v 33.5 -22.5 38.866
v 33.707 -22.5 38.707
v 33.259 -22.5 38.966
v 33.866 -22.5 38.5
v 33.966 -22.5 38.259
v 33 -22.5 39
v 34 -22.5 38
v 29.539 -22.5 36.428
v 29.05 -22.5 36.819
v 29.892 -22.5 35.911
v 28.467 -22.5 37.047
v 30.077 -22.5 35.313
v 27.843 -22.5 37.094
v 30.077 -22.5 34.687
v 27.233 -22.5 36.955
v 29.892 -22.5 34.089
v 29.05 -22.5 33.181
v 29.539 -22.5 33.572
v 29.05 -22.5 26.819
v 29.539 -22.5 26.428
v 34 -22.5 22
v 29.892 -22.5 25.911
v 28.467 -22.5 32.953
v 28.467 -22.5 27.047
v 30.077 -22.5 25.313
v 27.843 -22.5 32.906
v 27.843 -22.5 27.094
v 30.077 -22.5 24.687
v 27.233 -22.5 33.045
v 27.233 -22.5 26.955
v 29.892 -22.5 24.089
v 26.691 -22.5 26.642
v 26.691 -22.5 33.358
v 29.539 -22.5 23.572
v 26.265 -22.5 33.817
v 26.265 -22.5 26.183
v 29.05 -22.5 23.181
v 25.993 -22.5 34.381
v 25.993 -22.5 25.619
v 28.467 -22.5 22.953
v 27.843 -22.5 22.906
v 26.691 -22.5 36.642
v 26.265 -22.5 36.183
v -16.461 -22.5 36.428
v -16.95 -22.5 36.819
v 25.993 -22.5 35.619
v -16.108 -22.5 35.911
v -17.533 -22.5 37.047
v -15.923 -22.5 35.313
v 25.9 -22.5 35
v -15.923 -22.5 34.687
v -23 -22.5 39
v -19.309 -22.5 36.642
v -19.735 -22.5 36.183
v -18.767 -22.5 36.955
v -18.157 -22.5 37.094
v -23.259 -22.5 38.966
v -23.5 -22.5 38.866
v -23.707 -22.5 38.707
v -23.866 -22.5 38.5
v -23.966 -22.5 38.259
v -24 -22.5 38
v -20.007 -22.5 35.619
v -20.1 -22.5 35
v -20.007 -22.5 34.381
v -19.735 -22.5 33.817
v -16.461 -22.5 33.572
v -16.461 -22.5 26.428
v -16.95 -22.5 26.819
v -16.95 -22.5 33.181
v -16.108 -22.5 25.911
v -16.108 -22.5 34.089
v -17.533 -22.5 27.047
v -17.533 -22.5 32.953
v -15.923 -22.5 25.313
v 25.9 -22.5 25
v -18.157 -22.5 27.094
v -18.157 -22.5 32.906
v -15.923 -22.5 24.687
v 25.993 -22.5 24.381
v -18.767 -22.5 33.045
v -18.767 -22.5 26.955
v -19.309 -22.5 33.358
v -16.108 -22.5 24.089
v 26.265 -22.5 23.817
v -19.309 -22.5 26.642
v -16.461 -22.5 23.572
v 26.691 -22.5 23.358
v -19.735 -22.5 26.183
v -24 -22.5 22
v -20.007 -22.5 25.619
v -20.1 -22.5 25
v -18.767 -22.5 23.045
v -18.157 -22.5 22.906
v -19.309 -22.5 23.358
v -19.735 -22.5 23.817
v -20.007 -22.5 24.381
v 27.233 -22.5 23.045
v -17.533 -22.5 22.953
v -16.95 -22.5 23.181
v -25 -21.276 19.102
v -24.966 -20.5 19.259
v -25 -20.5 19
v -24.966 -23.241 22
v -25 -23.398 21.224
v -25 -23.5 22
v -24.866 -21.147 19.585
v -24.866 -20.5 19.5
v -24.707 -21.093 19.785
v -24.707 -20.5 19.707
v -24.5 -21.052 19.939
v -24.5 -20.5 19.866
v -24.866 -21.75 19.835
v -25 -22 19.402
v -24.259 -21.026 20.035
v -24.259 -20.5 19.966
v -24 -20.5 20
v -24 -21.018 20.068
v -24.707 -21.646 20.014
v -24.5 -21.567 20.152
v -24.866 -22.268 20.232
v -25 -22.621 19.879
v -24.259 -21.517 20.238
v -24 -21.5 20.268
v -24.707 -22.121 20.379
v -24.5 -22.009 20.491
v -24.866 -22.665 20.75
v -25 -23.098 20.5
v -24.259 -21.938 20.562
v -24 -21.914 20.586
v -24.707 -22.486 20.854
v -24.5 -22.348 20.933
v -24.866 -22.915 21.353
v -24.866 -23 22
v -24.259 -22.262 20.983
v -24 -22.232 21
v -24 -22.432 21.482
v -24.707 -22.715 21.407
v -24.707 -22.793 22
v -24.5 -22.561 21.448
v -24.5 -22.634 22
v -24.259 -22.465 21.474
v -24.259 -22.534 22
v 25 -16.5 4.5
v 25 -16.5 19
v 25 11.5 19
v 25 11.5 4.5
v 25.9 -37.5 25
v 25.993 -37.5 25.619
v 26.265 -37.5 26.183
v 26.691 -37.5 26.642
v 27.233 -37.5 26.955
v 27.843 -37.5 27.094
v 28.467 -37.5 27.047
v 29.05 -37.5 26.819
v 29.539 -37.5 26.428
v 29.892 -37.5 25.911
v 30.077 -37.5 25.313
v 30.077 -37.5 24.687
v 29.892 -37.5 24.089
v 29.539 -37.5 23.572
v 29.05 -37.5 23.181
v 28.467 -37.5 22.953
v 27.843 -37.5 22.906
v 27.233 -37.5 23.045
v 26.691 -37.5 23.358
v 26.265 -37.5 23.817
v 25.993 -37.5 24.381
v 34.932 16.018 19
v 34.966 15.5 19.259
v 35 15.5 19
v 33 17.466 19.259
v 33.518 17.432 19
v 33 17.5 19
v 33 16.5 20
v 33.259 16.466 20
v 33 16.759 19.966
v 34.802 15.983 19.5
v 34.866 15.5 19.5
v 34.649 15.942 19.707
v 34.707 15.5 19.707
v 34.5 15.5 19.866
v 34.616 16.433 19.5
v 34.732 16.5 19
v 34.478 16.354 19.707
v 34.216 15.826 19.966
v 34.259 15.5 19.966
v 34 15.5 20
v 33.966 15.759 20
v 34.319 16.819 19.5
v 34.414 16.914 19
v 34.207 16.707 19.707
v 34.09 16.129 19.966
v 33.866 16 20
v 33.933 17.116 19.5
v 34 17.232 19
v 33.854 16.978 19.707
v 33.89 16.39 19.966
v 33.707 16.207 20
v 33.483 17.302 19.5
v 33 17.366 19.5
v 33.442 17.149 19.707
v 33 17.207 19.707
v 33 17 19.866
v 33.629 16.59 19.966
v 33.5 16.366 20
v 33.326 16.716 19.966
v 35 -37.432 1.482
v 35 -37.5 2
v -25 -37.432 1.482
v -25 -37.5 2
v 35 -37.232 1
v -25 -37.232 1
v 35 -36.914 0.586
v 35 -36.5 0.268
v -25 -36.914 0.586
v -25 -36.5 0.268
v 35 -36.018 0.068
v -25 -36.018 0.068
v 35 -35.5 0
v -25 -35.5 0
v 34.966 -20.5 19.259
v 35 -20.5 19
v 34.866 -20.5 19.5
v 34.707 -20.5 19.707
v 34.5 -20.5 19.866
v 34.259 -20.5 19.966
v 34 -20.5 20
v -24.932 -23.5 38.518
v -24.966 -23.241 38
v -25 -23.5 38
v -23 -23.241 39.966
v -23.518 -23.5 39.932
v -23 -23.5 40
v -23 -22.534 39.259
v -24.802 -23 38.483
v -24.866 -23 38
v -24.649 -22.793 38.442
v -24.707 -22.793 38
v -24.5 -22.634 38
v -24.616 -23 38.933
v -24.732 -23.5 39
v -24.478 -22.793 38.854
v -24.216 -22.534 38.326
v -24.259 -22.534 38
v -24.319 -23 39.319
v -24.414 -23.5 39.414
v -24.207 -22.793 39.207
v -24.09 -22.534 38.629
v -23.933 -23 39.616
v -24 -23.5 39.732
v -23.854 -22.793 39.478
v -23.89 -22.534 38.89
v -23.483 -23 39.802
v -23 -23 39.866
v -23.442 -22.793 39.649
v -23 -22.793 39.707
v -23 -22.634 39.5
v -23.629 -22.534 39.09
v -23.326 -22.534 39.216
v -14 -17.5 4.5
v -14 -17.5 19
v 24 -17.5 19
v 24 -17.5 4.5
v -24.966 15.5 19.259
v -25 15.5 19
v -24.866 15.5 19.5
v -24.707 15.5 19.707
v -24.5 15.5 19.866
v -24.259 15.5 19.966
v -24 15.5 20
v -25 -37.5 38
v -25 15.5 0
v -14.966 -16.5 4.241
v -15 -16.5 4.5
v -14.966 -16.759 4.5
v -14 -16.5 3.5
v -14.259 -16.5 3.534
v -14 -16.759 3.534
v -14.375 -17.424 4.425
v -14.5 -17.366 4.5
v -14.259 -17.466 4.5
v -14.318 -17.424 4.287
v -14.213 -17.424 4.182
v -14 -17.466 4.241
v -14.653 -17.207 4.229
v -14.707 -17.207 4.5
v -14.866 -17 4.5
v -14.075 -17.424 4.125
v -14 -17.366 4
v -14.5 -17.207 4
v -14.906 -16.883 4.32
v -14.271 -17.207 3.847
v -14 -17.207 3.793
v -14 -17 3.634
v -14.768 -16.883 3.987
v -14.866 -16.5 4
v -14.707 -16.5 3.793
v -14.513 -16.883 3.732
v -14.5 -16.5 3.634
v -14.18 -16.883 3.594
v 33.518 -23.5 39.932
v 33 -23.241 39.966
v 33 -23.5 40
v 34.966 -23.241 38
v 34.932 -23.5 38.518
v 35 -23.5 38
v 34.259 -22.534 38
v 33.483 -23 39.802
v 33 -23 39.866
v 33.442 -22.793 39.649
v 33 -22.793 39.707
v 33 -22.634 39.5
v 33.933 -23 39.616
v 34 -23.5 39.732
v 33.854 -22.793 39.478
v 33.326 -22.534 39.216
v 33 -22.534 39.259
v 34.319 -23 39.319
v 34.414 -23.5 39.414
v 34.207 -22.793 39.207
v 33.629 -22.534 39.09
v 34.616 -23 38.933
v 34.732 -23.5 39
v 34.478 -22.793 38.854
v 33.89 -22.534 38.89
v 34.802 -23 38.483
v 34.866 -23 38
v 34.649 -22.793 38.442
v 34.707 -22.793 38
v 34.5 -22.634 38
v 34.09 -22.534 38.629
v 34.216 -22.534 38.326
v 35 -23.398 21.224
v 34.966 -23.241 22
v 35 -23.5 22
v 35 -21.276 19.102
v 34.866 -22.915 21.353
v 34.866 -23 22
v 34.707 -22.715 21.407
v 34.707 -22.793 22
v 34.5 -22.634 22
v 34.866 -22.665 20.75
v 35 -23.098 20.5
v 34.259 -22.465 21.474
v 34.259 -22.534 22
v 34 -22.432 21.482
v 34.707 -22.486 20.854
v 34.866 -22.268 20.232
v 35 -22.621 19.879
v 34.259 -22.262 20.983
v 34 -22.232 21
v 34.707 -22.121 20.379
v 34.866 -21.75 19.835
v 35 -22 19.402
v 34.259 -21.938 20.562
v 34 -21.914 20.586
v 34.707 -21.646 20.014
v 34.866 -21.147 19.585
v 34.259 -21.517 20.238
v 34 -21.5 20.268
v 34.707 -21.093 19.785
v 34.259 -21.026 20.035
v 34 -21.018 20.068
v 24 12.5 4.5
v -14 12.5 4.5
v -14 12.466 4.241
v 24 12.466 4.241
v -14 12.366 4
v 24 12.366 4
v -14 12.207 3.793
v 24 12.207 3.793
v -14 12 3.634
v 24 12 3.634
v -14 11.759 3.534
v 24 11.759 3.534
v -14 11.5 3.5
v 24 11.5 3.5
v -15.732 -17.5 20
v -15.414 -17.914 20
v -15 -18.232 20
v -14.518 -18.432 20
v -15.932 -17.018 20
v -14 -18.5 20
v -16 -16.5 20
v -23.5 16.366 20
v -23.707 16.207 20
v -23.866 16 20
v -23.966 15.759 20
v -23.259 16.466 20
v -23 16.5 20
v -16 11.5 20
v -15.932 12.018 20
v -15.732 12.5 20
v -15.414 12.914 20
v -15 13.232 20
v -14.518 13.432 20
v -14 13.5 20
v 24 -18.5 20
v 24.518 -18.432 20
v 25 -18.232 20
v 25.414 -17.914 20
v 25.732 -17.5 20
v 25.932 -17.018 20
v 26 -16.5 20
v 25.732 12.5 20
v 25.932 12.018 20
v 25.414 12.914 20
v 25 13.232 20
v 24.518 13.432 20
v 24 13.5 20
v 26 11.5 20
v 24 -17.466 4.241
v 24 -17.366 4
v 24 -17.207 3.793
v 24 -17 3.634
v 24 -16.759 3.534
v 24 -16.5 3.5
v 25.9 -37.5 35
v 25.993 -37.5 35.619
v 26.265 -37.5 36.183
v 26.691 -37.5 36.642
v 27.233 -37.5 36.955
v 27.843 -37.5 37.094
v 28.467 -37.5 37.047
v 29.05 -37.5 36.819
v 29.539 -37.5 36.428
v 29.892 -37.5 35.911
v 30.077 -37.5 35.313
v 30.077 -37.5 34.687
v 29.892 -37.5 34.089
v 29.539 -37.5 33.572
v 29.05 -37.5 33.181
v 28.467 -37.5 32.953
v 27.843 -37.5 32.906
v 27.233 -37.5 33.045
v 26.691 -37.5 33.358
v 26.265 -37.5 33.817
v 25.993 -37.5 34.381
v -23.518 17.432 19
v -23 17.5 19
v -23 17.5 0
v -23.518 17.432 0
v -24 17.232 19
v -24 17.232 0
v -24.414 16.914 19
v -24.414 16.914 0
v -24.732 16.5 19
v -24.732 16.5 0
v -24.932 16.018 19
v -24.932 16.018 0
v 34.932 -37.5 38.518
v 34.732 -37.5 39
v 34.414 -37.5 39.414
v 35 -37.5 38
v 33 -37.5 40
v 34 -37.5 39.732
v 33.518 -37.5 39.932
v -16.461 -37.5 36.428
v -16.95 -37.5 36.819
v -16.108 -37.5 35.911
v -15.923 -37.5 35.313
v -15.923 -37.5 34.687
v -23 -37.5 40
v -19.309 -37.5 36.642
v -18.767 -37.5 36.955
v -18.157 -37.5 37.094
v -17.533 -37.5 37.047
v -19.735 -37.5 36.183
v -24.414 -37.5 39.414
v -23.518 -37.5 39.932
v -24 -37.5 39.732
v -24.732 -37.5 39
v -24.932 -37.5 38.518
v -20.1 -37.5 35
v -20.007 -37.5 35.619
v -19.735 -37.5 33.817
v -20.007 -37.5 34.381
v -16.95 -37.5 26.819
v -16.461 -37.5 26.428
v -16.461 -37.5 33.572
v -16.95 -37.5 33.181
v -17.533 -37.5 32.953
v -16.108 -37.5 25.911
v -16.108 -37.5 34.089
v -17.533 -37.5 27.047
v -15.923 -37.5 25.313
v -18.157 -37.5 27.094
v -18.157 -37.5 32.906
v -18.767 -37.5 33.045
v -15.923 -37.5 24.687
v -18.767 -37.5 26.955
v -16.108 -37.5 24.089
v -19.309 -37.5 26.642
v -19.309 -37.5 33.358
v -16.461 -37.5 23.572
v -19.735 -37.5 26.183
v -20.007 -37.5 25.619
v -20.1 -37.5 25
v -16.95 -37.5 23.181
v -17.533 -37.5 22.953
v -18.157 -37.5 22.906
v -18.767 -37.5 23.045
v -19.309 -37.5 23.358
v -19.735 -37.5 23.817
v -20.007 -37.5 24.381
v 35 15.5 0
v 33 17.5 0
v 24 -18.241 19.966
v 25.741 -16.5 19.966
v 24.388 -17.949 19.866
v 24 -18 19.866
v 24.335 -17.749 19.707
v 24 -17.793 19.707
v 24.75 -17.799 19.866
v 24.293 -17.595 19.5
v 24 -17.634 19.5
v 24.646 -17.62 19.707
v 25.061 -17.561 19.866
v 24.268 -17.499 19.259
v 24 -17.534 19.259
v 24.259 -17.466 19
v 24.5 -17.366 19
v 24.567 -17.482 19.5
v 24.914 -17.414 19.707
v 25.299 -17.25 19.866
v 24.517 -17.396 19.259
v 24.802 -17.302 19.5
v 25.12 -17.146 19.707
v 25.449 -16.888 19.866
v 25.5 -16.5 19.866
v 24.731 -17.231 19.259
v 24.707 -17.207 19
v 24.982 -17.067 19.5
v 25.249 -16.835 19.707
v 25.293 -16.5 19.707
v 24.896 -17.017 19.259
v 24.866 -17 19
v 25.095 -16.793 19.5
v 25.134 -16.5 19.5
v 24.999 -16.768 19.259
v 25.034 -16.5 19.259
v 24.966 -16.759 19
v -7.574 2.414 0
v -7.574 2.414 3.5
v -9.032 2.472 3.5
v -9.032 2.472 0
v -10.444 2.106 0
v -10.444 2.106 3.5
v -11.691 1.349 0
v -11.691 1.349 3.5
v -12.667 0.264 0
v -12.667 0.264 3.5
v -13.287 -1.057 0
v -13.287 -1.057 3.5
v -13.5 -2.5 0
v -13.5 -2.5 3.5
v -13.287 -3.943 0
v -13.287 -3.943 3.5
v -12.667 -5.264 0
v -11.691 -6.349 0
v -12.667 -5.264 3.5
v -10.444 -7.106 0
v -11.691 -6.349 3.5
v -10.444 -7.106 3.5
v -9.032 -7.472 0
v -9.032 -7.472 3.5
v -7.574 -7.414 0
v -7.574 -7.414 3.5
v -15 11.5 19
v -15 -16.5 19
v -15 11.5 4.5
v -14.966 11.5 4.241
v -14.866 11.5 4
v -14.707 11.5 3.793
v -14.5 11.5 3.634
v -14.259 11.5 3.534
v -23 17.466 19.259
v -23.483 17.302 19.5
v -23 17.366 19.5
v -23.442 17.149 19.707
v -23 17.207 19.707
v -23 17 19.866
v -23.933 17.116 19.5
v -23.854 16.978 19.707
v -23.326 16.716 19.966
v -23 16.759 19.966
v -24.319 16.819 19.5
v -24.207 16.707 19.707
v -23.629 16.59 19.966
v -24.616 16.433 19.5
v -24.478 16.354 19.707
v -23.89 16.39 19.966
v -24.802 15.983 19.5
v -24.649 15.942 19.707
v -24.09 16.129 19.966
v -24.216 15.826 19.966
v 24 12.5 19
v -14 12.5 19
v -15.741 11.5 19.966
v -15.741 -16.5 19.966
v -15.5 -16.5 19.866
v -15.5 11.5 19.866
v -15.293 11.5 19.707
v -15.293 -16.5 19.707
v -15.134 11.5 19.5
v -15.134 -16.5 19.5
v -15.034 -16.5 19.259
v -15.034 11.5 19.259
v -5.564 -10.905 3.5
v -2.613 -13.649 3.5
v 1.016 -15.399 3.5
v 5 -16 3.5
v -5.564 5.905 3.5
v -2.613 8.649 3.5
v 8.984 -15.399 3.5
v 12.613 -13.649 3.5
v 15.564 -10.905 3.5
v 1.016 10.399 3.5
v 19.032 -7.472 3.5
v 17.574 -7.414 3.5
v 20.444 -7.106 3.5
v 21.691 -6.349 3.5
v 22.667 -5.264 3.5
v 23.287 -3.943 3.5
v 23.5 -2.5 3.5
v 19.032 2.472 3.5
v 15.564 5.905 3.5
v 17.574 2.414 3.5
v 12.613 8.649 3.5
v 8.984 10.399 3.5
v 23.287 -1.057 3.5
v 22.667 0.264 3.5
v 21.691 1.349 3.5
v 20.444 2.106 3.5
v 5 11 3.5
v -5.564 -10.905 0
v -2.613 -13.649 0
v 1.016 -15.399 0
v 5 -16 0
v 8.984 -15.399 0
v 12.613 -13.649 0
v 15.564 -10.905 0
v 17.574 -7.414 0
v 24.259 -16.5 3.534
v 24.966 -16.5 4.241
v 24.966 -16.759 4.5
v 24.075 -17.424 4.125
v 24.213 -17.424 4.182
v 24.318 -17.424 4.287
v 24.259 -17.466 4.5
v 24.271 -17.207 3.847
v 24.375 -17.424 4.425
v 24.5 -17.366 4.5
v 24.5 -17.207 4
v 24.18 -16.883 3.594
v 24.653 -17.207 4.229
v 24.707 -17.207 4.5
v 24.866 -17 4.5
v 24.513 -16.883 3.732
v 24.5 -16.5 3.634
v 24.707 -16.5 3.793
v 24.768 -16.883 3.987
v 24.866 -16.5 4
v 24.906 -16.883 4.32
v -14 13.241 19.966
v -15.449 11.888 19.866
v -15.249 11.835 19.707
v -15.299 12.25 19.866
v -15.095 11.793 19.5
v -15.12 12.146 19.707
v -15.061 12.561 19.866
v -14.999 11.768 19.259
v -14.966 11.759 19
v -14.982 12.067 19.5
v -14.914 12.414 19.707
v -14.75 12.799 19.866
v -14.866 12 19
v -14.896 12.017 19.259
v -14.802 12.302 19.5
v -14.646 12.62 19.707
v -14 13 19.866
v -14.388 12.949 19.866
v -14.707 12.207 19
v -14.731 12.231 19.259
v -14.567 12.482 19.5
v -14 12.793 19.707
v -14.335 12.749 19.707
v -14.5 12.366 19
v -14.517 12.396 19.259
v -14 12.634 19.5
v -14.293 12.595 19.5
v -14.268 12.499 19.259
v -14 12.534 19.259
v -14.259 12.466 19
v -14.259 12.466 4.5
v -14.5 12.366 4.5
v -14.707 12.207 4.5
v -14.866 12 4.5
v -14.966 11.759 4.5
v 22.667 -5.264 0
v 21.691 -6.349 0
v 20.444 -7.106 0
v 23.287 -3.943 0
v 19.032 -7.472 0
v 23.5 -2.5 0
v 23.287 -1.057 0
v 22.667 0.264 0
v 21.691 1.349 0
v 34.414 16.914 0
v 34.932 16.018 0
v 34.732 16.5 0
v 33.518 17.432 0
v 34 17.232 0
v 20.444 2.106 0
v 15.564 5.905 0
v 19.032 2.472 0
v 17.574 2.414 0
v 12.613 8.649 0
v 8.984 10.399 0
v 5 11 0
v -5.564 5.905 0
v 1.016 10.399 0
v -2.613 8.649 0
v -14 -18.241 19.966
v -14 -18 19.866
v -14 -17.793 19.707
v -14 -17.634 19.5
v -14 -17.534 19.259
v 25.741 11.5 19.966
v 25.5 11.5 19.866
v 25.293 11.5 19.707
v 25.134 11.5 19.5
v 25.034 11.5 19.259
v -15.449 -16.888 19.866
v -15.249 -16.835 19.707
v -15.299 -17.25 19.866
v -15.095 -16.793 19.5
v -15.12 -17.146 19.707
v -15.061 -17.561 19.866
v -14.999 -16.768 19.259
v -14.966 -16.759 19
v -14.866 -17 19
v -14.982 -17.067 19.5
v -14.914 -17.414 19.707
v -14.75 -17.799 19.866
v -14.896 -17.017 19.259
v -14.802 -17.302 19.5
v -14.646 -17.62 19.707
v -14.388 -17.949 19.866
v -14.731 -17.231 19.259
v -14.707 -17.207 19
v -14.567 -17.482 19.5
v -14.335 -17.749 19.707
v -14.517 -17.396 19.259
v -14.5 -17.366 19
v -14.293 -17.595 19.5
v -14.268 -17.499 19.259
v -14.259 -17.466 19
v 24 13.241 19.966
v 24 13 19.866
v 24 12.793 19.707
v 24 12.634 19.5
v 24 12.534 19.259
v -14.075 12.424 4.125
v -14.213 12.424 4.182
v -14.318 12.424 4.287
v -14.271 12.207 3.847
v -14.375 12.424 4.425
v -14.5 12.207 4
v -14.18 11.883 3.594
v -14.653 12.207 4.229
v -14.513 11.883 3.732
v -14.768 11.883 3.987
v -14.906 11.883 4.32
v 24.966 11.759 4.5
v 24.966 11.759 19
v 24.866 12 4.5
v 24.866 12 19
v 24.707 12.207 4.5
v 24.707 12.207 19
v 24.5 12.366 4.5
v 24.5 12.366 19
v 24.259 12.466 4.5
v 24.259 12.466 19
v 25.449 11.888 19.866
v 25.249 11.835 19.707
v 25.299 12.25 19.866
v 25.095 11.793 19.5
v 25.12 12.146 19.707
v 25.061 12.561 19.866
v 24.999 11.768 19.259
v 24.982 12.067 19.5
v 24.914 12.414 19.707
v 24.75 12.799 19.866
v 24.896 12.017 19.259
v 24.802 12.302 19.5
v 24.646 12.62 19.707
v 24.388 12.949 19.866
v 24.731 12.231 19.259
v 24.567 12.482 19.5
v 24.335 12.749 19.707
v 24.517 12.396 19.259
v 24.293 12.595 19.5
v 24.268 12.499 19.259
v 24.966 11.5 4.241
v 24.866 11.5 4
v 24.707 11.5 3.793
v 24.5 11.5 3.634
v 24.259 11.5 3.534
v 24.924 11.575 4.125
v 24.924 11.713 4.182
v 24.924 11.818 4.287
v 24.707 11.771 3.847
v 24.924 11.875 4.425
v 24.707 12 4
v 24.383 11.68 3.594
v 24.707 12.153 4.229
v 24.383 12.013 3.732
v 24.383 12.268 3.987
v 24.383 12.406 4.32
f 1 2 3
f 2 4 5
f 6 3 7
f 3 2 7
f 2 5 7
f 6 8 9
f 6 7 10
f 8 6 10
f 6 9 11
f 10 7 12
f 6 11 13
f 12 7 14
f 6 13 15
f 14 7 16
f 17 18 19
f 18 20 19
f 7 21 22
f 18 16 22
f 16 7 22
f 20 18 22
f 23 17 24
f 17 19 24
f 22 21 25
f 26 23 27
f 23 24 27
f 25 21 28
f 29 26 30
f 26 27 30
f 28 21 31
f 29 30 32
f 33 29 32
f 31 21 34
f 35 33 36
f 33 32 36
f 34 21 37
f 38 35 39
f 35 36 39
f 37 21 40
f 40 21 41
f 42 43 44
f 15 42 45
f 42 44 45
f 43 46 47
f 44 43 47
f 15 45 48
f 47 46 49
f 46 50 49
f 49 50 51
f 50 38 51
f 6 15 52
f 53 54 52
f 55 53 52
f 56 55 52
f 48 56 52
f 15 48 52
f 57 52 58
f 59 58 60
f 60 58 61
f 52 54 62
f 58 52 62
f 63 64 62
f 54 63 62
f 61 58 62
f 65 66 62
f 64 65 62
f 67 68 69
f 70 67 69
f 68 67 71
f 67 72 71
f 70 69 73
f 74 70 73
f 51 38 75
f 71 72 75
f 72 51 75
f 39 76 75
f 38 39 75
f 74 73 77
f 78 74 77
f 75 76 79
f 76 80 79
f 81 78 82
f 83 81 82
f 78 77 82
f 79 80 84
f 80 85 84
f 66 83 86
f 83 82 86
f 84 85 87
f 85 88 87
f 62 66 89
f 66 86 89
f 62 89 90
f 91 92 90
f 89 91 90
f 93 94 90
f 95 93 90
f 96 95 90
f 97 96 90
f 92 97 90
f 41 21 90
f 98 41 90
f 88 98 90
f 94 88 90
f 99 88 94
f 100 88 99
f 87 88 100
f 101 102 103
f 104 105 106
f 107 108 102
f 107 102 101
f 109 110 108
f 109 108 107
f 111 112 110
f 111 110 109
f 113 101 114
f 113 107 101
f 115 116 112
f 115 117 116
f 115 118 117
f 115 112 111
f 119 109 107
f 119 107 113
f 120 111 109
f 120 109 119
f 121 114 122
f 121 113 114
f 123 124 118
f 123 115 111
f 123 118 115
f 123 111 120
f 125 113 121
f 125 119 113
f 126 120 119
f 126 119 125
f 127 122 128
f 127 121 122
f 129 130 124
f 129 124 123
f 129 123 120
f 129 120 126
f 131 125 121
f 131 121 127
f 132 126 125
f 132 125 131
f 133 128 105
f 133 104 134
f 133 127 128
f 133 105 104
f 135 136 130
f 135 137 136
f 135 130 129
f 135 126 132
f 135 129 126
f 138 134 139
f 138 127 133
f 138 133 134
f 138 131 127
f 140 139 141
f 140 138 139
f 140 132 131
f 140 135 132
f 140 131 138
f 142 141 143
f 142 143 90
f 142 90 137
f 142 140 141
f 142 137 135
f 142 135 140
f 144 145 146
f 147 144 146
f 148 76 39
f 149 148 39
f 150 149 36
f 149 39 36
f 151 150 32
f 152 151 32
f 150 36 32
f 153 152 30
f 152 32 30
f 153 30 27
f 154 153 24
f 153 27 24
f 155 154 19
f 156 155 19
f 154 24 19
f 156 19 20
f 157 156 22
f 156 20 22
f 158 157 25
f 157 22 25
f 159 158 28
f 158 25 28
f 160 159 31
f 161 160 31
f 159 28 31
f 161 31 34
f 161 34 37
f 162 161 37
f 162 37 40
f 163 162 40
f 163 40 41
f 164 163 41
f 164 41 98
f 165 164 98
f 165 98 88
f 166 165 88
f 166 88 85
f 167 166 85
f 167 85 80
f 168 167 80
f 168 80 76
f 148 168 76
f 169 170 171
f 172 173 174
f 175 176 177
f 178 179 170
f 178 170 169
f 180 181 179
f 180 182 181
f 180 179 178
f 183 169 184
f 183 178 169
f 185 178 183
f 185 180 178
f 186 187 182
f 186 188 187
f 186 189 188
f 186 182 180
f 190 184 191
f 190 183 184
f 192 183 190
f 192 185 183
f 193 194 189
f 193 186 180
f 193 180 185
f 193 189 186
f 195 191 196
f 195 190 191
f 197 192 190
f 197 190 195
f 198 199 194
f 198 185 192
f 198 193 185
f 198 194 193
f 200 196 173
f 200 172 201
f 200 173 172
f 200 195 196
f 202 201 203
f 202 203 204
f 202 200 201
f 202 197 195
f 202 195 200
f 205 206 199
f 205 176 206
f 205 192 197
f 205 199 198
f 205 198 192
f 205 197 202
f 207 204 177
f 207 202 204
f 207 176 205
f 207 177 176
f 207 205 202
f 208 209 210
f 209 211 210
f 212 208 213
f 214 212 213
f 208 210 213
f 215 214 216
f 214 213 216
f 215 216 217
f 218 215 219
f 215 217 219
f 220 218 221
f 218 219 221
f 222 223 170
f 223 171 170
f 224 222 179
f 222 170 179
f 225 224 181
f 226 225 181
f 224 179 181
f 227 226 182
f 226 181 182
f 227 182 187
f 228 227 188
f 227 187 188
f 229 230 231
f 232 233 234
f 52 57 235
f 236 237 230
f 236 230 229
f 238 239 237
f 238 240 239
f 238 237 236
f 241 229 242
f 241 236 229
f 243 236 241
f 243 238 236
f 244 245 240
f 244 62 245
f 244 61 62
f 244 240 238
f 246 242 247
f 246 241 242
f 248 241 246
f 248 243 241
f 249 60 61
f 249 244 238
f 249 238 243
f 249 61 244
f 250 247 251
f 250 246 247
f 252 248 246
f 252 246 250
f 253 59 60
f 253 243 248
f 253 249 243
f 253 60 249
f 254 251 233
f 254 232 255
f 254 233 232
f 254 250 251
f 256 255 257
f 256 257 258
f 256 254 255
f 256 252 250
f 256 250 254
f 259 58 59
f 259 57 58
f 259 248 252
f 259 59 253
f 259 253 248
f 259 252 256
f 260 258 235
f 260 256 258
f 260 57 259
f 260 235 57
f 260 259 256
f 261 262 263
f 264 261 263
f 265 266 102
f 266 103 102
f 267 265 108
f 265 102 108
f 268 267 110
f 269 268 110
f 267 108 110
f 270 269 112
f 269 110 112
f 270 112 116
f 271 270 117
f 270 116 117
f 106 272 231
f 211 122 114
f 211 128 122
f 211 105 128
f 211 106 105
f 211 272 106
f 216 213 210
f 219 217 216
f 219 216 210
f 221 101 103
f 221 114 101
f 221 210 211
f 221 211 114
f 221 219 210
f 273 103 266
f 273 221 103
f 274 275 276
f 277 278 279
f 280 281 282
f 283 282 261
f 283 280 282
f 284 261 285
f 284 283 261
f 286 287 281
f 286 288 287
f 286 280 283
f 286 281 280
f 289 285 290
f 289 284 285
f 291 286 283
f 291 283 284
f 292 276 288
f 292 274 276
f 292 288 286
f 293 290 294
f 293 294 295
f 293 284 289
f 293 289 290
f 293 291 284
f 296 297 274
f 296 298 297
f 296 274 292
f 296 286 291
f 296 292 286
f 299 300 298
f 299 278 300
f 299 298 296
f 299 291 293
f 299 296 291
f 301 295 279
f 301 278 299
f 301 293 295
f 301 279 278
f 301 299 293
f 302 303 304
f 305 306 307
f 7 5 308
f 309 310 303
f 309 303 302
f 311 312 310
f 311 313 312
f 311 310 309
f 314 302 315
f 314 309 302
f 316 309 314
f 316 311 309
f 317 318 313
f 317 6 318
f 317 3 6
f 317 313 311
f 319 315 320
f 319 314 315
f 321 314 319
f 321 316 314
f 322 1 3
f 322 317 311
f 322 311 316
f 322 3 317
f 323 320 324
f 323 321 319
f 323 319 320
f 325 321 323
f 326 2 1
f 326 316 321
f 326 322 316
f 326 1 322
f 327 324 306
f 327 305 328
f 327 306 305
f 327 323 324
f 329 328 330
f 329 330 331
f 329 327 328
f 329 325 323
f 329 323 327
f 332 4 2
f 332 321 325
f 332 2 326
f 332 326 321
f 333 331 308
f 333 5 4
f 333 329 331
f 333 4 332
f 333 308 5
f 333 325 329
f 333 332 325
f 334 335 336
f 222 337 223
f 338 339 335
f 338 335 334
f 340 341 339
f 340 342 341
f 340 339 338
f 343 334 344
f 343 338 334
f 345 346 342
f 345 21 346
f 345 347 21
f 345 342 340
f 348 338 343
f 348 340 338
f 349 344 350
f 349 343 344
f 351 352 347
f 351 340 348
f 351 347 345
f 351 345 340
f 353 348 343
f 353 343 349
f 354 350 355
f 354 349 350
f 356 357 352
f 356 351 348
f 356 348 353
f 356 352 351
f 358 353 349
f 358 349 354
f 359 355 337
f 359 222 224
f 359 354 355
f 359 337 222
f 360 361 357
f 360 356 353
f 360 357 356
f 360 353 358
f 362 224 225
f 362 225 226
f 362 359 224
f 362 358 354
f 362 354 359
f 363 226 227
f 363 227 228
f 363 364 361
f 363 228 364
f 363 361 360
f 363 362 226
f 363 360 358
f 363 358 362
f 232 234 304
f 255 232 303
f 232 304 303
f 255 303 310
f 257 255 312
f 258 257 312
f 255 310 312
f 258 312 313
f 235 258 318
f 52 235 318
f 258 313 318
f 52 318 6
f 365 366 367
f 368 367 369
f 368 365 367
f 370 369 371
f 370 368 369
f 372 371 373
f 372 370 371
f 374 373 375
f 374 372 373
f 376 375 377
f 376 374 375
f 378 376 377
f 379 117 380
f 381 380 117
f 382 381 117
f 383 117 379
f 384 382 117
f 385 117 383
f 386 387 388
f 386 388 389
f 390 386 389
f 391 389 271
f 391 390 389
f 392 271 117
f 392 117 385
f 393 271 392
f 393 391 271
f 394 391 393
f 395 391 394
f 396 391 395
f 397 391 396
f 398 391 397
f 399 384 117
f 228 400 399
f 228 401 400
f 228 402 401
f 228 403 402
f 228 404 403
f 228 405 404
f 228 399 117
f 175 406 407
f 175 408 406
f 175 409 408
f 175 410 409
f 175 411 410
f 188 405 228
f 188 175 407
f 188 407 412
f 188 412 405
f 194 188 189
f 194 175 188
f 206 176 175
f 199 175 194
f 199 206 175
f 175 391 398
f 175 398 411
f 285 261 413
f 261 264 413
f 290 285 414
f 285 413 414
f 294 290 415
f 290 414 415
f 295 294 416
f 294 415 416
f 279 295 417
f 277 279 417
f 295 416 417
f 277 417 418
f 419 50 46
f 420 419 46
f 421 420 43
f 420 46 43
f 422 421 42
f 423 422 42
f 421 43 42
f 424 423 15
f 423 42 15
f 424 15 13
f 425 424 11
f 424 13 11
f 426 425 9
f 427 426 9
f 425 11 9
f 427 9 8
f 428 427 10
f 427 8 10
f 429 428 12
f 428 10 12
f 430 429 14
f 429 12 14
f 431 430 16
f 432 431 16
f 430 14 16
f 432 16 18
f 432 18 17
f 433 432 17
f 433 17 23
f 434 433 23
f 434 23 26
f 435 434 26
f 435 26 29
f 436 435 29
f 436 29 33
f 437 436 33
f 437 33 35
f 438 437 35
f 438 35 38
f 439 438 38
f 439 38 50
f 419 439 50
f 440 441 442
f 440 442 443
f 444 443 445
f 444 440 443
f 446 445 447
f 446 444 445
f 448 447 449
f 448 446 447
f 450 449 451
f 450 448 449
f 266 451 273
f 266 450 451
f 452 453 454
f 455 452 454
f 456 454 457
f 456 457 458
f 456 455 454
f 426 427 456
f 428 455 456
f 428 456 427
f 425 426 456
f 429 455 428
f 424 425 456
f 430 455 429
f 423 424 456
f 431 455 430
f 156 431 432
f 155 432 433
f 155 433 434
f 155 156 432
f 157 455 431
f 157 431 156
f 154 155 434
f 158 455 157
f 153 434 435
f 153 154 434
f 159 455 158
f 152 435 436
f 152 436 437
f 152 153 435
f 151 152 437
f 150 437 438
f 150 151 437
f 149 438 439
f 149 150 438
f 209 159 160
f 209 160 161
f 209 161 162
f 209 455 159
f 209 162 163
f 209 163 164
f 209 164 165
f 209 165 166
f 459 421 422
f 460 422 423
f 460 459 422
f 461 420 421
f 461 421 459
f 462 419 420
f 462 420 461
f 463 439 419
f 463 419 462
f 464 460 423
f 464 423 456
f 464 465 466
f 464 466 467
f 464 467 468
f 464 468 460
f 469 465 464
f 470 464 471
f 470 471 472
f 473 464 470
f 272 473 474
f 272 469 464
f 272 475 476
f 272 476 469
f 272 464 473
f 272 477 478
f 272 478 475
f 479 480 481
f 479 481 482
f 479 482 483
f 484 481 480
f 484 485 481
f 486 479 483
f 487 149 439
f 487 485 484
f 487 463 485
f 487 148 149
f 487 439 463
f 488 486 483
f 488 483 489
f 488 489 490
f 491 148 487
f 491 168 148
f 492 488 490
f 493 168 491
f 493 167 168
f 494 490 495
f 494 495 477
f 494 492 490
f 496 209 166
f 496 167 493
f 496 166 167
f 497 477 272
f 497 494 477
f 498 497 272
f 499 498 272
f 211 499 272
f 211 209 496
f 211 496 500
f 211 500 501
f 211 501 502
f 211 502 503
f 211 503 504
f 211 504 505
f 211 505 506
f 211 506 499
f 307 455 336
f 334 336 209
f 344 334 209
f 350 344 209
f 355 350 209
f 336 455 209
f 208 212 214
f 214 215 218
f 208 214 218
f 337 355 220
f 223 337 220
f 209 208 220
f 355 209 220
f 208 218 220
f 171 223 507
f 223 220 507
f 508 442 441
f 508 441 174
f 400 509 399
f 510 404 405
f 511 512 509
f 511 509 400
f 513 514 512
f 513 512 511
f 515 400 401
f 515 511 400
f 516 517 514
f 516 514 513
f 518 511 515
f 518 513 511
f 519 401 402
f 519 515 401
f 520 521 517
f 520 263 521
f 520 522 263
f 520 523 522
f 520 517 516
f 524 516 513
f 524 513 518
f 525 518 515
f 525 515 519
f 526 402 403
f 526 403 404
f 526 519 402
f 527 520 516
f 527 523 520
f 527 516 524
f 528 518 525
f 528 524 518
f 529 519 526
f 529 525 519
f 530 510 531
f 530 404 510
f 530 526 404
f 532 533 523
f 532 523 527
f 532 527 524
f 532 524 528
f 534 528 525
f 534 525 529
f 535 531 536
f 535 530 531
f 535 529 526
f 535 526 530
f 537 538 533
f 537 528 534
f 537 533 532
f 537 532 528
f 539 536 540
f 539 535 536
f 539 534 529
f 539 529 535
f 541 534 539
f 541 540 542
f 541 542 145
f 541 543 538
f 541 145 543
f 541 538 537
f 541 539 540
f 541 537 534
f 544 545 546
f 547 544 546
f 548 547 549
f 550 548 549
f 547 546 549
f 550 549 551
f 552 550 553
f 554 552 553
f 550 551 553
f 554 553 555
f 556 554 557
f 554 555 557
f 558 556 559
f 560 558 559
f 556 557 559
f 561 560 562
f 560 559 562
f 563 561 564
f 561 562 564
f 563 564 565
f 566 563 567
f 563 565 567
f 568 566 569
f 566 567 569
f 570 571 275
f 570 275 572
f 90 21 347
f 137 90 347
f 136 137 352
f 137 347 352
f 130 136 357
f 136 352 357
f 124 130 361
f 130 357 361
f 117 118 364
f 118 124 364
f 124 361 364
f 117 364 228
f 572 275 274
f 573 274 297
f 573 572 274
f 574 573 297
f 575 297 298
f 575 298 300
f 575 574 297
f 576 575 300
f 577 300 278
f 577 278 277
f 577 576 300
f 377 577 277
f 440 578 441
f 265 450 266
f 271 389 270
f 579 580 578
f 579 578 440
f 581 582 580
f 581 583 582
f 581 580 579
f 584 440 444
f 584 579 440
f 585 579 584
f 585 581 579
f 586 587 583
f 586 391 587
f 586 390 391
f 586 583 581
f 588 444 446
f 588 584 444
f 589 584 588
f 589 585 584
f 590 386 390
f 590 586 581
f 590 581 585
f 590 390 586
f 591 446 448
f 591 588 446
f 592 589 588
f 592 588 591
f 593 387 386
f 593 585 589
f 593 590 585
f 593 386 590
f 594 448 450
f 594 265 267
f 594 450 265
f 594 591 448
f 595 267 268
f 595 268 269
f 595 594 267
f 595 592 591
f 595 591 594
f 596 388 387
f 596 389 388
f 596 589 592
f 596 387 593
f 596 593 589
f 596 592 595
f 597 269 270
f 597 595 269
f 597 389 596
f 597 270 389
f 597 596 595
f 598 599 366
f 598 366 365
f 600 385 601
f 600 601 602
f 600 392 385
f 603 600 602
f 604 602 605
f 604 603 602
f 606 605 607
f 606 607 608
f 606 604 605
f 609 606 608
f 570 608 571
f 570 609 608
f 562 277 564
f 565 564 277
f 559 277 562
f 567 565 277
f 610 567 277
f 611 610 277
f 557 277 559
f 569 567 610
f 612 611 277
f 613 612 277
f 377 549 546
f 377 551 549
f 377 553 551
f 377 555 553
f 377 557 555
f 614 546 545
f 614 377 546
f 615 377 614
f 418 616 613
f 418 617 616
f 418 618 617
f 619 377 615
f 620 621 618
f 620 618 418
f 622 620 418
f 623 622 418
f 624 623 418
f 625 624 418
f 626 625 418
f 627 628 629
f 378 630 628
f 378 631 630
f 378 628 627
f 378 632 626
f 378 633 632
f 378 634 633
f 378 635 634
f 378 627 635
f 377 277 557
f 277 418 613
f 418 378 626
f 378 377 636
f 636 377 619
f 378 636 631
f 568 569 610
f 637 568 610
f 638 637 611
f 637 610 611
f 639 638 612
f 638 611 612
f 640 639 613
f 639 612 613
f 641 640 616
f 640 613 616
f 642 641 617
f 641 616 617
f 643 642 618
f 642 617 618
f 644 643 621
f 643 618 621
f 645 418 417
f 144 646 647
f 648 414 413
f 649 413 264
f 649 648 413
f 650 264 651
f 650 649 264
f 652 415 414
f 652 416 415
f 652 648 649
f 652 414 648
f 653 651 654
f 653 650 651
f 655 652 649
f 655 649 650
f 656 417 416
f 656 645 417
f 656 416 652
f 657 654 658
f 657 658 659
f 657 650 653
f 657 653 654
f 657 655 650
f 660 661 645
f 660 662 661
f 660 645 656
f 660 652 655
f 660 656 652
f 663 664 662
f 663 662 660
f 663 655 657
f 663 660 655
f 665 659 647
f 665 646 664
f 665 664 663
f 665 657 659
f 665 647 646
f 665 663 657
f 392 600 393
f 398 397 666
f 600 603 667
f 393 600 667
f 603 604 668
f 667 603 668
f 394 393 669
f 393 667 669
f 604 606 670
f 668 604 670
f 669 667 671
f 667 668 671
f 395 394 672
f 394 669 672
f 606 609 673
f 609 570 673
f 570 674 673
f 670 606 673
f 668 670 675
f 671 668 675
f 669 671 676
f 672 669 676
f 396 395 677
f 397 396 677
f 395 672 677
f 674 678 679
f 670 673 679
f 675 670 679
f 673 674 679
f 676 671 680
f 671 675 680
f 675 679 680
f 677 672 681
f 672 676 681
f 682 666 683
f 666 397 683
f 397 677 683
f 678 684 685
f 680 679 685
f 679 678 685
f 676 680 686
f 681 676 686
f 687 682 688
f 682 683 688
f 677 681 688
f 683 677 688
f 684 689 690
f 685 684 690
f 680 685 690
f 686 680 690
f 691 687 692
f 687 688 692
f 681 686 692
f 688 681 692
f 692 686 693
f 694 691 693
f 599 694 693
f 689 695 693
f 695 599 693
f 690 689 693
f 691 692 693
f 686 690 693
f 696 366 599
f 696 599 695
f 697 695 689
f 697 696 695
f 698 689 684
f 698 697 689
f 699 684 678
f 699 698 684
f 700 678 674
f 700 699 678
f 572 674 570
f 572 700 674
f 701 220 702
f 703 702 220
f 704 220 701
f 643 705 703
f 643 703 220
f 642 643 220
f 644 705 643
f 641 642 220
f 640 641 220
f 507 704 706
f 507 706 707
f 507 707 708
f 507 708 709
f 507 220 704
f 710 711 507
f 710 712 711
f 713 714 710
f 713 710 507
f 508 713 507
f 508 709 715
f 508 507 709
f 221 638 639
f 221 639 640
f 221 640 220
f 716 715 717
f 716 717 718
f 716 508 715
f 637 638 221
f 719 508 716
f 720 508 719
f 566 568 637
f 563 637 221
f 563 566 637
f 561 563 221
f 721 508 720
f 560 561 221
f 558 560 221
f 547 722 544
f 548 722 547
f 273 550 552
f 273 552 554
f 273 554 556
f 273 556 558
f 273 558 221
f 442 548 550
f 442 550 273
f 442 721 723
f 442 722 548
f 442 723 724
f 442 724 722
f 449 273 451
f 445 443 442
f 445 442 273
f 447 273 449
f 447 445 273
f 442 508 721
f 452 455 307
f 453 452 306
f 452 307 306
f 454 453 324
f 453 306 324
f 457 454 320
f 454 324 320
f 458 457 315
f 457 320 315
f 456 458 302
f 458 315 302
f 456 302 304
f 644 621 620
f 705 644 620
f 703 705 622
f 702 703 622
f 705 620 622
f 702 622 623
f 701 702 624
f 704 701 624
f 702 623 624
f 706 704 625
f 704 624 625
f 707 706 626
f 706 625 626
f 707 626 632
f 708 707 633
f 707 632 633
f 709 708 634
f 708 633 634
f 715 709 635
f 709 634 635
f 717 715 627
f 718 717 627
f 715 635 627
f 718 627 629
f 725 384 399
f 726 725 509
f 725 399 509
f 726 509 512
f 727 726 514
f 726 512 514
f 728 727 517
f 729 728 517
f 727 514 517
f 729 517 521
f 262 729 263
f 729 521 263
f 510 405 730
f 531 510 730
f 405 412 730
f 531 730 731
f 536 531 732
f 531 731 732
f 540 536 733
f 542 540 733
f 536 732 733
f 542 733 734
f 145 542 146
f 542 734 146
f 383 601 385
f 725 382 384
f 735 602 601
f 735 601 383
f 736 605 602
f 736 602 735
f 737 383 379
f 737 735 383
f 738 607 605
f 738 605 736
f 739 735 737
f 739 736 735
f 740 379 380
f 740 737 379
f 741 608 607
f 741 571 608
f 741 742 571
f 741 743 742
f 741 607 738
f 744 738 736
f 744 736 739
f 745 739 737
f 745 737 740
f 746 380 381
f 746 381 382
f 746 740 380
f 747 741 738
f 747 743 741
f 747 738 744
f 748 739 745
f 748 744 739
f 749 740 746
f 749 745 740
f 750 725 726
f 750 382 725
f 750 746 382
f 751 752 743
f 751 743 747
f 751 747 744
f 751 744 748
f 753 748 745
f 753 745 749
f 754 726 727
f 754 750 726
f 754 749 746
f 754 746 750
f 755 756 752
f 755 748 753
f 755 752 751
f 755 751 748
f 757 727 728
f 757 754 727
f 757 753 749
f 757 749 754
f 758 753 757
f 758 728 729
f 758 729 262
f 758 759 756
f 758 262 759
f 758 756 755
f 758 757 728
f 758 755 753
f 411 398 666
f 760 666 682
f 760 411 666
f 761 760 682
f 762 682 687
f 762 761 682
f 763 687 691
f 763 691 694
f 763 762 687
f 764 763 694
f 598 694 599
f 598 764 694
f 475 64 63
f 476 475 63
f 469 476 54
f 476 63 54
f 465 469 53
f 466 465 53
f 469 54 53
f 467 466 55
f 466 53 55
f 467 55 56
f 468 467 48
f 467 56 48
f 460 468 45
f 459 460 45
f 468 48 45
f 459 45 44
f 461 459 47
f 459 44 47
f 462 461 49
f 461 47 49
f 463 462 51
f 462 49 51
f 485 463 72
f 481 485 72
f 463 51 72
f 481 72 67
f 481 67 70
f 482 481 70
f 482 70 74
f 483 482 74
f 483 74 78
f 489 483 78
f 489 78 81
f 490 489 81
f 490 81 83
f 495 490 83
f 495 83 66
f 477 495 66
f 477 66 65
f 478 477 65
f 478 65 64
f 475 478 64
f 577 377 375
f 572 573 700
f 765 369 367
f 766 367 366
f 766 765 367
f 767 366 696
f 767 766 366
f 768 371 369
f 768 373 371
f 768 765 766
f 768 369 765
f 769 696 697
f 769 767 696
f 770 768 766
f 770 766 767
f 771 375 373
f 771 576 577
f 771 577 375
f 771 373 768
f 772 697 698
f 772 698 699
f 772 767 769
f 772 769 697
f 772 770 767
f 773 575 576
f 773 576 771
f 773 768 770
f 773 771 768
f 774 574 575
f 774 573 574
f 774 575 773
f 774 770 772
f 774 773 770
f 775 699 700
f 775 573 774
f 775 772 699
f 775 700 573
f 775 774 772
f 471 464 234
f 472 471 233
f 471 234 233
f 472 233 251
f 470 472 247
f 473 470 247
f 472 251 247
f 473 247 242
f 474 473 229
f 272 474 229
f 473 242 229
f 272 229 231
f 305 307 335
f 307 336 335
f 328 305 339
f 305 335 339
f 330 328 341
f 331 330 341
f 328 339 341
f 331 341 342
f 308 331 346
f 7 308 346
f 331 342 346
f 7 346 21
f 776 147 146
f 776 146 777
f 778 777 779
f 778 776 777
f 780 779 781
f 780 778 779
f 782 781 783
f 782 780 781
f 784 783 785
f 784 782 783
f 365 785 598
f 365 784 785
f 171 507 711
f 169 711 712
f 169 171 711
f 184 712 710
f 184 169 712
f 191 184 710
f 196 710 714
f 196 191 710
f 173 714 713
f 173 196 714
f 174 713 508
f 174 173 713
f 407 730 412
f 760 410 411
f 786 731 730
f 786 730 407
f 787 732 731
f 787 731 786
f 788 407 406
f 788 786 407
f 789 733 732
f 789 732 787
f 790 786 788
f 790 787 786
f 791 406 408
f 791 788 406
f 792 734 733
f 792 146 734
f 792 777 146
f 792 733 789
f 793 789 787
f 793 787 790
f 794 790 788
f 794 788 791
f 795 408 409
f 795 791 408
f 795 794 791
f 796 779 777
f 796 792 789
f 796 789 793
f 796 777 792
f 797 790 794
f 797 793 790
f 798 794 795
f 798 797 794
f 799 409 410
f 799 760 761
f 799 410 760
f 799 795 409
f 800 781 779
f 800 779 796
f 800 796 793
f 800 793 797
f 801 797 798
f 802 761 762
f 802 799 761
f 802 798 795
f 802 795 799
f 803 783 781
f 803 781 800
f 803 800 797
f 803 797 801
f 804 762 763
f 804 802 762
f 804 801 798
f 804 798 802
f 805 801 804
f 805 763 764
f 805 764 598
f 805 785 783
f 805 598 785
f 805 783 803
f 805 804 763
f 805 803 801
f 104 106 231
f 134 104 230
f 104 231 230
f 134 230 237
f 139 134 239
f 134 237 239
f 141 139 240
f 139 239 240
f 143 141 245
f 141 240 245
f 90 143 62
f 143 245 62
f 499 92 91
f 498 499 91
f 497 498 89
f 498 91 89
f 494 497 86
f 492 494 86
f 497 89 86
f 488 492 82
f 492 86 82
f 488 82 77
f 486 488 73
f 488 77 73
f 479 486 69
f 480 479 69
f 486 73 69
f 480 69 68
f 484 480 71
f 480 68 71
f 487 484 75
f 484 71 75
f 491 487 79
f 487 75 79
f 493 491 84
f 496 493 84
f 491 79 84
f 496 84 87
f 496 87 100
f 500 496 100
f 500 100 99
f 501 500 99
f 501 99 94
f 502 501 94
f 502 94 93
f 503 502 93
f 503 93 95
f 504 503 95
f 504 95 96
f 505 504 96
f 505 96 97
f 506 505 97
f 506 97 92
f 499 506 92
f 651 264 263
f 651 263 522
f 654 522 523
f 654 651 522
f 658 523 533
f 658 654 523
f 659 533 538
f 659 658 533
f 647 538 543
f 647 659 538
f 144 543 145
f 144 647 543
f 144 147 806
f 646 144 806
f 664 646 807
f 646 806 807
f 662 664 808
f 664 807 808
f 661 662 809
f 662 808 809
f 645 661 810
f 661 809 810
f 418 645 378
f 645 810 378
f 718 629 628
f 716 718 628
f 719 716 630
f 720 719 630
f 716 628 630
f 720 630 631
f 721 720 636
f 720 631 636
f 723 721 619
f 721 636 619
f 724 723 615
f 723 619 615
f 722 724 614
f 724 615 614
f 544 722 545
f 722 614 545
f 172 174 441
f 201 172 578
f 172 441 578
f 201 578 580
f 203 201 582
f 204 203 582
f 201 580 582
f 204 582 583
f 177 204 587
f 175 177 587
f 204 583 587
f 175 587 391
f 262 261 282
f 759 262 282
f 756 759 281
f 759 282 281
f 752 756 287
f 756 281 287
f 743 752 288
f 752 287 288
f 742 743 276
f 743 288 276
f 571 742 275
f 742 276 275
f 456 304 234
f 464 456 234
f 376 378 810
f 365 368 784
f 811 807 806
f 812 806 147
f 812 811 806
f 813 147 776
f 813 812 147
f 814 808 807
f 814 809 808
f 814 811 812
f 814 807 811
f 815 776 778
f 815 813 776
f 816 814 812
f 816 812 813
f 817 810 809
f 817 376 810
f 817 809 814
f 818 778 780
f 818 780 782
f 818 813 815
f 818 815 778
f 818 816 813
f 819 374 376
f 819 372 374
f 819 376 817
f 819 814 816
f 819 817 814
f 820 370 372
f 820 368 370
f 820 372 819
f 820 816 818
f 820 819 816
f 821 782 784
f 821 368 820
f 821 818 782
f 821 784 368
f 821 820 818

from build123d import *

# Parameters (mm, degrees)
SKETCH1_W               = 60
SKETCH1_H               = 40
BOSS_EXTRUDE1_DEPTH     = 20
CUT_EXTRUDE1_DEPTH      = 30
SKETCH3_W               = 60
SKETCH3_H               = 15
BOSS_EXTRUDE2_DEPTH     = 40
SKETCH4_R               = 2.1
CUT_EXTRUDE2_DEPTH      = 20
FILLET1_R               = 2
FILLET2_R               = 2
ESQUISSE1_W             = 40
ESQUISSE1_H             = 30
ENL_V_MAT_EXTRU_1_DEPTH = 16.5
CONG_1_R                = 1


with BuildPart() as part:
    # Sketch1 → Boss-Extrude1 (new body)
    with BuildSketch(Plane.XY):
        with Locations((5, -2.5)):
            Rectangle(SKETCH1_W, SKETCH1_H)
    extrude(amount=BOSS_EXTRUDE1_DEPTH)

    # Sketch2 → Cut-Extrude1 (cut)
    with BuildSketch(Plane.XY.offset(20)):
        with BuildLine():
            ThreePointArc((-7.574074074, -7.413518208), (5, -16), (17.574074074, -7.413518208))
            ThreePointArc((17.574074074, -7.413518208), (23.5, -2.5), (17.574074074, 2.413518208))
            ThreePointArc((17.574074074, 2.413518208), (5, 11), (-7.574074074, 2.413518208))
            ThreePointArc((-7.574074074, 2.413518208), (-13.5, -2.5), (-7.574074074, -7.413518208))
        make_face()
    extrude(amount=-CUT_EXTRUDE1_DEPTH, mode=Mode.SUBTRACT)

    # Sketch3 → Boss-Extrude2 (add)
    with BuildSketch(Plane(origin=(0, 0, 0), x_dir=(-1, 0, 0), z_dir=(0, 0, -1))):
        with Locations((-5, -30)):
            Rectangle(SKETCH3_W, SKETCH3_H)
    extrude(amount=-BOSS_EXTRUDE2_DEPTH)

    # Sketch4 → Cut-Extrude2 (cut)
    with BuildSketch(Plane(origin=(0, -22.5, 0), x_dir=(1, 0, 0), z_dir=(0, 1, 0))):
        with Locations(Location((-18, -35, 0), (0, 0, 180))):
            Circle(SKETCH4_R)
        with Locations(Location((-18, -25, 0), (0, 0, 180))):
            Circle(SKETCH4_R)
        with Locations(Location((28, -35, 0), (0, 0, 180))):
            Circle(SKETCH4_R)
        with Locations(Location((28, -25, 0), (0, 0, 180))):
            Circle(SKETCH4_R)
    extrude(amount=-CUT_EXTRUDE2_DEPTH, mode=Mode.SUBTRACT)

    # Fillet1
    fillet1_edges = [part.edges().sort_by_distance(p)[0] for p in [
        (5, -22.5, 20),
    ]]
    fillet(fillet1_edges, radius=FILLET1_R)

    # Fillet2
    fillet2_edges = [part.edges().sort_by_distance(p)[0] for p in [
        (35, -30, 40),
        (-25, -30, 40),
        (5, -37.5, 0),
        (-25, 17.5, 10),
        (35, 17.5, 10),
    ]]
    fillet(fillet2_edges, radius=FILLET2_R)

    # Esquisse1 → Enlèv. mat.-Extru.1 (cut)
    with BuildSketch(Plane.XY.offset(20)):
        with Locations((5, -2.5)):
            Rectangle(ESQUISSE1_W, ESQUISSE1_H)
    extrude(amount=-ENL_V_MAT_EXTRU_1_DEPTH, mode=Mode.SUBTRACT)

    # Congé1
    cong_1_edges = [part.edges().sort_by_distance(p)[0] for p in [
        (-15, -2.5, 20),
        (5, -17.5, 20),
        (25, -2.5, 20),
        (5, 12.5, 20),
        (-15, -2.5, 3.5),
        (-15, -17.5, 11.75),
        (5, 12.5, 3.5),
        (-15, 12.5, 11.75),
        (25, -2.5, 3.5),
        (25, 12.5, 11.75),
        (5, -17.5, 3.5),
        (25, -17.5, 11.75),
        (35, -2.5, 20),
        (35, -21.914213562, 20.585786438),
        (-25, -21.914213562, 20.585786438),
        (-25, -22.5, 30),
        (-25, -2.5, 20),
        (35, -22.5, 30),
        (5, -22.5, 40),
        (-24.414213562, -22.5, 39.414213562),
        (34.414213562, -22.5, 39.414213562),
        (5, 17.5, 20),
        (34.414213562, 16.914213562, 20),
        (-24.414213562, 16.914213562, 20),
    ]]
    fillet(cong_1_edges, radius=CONG_1_R)


solid = part.part
